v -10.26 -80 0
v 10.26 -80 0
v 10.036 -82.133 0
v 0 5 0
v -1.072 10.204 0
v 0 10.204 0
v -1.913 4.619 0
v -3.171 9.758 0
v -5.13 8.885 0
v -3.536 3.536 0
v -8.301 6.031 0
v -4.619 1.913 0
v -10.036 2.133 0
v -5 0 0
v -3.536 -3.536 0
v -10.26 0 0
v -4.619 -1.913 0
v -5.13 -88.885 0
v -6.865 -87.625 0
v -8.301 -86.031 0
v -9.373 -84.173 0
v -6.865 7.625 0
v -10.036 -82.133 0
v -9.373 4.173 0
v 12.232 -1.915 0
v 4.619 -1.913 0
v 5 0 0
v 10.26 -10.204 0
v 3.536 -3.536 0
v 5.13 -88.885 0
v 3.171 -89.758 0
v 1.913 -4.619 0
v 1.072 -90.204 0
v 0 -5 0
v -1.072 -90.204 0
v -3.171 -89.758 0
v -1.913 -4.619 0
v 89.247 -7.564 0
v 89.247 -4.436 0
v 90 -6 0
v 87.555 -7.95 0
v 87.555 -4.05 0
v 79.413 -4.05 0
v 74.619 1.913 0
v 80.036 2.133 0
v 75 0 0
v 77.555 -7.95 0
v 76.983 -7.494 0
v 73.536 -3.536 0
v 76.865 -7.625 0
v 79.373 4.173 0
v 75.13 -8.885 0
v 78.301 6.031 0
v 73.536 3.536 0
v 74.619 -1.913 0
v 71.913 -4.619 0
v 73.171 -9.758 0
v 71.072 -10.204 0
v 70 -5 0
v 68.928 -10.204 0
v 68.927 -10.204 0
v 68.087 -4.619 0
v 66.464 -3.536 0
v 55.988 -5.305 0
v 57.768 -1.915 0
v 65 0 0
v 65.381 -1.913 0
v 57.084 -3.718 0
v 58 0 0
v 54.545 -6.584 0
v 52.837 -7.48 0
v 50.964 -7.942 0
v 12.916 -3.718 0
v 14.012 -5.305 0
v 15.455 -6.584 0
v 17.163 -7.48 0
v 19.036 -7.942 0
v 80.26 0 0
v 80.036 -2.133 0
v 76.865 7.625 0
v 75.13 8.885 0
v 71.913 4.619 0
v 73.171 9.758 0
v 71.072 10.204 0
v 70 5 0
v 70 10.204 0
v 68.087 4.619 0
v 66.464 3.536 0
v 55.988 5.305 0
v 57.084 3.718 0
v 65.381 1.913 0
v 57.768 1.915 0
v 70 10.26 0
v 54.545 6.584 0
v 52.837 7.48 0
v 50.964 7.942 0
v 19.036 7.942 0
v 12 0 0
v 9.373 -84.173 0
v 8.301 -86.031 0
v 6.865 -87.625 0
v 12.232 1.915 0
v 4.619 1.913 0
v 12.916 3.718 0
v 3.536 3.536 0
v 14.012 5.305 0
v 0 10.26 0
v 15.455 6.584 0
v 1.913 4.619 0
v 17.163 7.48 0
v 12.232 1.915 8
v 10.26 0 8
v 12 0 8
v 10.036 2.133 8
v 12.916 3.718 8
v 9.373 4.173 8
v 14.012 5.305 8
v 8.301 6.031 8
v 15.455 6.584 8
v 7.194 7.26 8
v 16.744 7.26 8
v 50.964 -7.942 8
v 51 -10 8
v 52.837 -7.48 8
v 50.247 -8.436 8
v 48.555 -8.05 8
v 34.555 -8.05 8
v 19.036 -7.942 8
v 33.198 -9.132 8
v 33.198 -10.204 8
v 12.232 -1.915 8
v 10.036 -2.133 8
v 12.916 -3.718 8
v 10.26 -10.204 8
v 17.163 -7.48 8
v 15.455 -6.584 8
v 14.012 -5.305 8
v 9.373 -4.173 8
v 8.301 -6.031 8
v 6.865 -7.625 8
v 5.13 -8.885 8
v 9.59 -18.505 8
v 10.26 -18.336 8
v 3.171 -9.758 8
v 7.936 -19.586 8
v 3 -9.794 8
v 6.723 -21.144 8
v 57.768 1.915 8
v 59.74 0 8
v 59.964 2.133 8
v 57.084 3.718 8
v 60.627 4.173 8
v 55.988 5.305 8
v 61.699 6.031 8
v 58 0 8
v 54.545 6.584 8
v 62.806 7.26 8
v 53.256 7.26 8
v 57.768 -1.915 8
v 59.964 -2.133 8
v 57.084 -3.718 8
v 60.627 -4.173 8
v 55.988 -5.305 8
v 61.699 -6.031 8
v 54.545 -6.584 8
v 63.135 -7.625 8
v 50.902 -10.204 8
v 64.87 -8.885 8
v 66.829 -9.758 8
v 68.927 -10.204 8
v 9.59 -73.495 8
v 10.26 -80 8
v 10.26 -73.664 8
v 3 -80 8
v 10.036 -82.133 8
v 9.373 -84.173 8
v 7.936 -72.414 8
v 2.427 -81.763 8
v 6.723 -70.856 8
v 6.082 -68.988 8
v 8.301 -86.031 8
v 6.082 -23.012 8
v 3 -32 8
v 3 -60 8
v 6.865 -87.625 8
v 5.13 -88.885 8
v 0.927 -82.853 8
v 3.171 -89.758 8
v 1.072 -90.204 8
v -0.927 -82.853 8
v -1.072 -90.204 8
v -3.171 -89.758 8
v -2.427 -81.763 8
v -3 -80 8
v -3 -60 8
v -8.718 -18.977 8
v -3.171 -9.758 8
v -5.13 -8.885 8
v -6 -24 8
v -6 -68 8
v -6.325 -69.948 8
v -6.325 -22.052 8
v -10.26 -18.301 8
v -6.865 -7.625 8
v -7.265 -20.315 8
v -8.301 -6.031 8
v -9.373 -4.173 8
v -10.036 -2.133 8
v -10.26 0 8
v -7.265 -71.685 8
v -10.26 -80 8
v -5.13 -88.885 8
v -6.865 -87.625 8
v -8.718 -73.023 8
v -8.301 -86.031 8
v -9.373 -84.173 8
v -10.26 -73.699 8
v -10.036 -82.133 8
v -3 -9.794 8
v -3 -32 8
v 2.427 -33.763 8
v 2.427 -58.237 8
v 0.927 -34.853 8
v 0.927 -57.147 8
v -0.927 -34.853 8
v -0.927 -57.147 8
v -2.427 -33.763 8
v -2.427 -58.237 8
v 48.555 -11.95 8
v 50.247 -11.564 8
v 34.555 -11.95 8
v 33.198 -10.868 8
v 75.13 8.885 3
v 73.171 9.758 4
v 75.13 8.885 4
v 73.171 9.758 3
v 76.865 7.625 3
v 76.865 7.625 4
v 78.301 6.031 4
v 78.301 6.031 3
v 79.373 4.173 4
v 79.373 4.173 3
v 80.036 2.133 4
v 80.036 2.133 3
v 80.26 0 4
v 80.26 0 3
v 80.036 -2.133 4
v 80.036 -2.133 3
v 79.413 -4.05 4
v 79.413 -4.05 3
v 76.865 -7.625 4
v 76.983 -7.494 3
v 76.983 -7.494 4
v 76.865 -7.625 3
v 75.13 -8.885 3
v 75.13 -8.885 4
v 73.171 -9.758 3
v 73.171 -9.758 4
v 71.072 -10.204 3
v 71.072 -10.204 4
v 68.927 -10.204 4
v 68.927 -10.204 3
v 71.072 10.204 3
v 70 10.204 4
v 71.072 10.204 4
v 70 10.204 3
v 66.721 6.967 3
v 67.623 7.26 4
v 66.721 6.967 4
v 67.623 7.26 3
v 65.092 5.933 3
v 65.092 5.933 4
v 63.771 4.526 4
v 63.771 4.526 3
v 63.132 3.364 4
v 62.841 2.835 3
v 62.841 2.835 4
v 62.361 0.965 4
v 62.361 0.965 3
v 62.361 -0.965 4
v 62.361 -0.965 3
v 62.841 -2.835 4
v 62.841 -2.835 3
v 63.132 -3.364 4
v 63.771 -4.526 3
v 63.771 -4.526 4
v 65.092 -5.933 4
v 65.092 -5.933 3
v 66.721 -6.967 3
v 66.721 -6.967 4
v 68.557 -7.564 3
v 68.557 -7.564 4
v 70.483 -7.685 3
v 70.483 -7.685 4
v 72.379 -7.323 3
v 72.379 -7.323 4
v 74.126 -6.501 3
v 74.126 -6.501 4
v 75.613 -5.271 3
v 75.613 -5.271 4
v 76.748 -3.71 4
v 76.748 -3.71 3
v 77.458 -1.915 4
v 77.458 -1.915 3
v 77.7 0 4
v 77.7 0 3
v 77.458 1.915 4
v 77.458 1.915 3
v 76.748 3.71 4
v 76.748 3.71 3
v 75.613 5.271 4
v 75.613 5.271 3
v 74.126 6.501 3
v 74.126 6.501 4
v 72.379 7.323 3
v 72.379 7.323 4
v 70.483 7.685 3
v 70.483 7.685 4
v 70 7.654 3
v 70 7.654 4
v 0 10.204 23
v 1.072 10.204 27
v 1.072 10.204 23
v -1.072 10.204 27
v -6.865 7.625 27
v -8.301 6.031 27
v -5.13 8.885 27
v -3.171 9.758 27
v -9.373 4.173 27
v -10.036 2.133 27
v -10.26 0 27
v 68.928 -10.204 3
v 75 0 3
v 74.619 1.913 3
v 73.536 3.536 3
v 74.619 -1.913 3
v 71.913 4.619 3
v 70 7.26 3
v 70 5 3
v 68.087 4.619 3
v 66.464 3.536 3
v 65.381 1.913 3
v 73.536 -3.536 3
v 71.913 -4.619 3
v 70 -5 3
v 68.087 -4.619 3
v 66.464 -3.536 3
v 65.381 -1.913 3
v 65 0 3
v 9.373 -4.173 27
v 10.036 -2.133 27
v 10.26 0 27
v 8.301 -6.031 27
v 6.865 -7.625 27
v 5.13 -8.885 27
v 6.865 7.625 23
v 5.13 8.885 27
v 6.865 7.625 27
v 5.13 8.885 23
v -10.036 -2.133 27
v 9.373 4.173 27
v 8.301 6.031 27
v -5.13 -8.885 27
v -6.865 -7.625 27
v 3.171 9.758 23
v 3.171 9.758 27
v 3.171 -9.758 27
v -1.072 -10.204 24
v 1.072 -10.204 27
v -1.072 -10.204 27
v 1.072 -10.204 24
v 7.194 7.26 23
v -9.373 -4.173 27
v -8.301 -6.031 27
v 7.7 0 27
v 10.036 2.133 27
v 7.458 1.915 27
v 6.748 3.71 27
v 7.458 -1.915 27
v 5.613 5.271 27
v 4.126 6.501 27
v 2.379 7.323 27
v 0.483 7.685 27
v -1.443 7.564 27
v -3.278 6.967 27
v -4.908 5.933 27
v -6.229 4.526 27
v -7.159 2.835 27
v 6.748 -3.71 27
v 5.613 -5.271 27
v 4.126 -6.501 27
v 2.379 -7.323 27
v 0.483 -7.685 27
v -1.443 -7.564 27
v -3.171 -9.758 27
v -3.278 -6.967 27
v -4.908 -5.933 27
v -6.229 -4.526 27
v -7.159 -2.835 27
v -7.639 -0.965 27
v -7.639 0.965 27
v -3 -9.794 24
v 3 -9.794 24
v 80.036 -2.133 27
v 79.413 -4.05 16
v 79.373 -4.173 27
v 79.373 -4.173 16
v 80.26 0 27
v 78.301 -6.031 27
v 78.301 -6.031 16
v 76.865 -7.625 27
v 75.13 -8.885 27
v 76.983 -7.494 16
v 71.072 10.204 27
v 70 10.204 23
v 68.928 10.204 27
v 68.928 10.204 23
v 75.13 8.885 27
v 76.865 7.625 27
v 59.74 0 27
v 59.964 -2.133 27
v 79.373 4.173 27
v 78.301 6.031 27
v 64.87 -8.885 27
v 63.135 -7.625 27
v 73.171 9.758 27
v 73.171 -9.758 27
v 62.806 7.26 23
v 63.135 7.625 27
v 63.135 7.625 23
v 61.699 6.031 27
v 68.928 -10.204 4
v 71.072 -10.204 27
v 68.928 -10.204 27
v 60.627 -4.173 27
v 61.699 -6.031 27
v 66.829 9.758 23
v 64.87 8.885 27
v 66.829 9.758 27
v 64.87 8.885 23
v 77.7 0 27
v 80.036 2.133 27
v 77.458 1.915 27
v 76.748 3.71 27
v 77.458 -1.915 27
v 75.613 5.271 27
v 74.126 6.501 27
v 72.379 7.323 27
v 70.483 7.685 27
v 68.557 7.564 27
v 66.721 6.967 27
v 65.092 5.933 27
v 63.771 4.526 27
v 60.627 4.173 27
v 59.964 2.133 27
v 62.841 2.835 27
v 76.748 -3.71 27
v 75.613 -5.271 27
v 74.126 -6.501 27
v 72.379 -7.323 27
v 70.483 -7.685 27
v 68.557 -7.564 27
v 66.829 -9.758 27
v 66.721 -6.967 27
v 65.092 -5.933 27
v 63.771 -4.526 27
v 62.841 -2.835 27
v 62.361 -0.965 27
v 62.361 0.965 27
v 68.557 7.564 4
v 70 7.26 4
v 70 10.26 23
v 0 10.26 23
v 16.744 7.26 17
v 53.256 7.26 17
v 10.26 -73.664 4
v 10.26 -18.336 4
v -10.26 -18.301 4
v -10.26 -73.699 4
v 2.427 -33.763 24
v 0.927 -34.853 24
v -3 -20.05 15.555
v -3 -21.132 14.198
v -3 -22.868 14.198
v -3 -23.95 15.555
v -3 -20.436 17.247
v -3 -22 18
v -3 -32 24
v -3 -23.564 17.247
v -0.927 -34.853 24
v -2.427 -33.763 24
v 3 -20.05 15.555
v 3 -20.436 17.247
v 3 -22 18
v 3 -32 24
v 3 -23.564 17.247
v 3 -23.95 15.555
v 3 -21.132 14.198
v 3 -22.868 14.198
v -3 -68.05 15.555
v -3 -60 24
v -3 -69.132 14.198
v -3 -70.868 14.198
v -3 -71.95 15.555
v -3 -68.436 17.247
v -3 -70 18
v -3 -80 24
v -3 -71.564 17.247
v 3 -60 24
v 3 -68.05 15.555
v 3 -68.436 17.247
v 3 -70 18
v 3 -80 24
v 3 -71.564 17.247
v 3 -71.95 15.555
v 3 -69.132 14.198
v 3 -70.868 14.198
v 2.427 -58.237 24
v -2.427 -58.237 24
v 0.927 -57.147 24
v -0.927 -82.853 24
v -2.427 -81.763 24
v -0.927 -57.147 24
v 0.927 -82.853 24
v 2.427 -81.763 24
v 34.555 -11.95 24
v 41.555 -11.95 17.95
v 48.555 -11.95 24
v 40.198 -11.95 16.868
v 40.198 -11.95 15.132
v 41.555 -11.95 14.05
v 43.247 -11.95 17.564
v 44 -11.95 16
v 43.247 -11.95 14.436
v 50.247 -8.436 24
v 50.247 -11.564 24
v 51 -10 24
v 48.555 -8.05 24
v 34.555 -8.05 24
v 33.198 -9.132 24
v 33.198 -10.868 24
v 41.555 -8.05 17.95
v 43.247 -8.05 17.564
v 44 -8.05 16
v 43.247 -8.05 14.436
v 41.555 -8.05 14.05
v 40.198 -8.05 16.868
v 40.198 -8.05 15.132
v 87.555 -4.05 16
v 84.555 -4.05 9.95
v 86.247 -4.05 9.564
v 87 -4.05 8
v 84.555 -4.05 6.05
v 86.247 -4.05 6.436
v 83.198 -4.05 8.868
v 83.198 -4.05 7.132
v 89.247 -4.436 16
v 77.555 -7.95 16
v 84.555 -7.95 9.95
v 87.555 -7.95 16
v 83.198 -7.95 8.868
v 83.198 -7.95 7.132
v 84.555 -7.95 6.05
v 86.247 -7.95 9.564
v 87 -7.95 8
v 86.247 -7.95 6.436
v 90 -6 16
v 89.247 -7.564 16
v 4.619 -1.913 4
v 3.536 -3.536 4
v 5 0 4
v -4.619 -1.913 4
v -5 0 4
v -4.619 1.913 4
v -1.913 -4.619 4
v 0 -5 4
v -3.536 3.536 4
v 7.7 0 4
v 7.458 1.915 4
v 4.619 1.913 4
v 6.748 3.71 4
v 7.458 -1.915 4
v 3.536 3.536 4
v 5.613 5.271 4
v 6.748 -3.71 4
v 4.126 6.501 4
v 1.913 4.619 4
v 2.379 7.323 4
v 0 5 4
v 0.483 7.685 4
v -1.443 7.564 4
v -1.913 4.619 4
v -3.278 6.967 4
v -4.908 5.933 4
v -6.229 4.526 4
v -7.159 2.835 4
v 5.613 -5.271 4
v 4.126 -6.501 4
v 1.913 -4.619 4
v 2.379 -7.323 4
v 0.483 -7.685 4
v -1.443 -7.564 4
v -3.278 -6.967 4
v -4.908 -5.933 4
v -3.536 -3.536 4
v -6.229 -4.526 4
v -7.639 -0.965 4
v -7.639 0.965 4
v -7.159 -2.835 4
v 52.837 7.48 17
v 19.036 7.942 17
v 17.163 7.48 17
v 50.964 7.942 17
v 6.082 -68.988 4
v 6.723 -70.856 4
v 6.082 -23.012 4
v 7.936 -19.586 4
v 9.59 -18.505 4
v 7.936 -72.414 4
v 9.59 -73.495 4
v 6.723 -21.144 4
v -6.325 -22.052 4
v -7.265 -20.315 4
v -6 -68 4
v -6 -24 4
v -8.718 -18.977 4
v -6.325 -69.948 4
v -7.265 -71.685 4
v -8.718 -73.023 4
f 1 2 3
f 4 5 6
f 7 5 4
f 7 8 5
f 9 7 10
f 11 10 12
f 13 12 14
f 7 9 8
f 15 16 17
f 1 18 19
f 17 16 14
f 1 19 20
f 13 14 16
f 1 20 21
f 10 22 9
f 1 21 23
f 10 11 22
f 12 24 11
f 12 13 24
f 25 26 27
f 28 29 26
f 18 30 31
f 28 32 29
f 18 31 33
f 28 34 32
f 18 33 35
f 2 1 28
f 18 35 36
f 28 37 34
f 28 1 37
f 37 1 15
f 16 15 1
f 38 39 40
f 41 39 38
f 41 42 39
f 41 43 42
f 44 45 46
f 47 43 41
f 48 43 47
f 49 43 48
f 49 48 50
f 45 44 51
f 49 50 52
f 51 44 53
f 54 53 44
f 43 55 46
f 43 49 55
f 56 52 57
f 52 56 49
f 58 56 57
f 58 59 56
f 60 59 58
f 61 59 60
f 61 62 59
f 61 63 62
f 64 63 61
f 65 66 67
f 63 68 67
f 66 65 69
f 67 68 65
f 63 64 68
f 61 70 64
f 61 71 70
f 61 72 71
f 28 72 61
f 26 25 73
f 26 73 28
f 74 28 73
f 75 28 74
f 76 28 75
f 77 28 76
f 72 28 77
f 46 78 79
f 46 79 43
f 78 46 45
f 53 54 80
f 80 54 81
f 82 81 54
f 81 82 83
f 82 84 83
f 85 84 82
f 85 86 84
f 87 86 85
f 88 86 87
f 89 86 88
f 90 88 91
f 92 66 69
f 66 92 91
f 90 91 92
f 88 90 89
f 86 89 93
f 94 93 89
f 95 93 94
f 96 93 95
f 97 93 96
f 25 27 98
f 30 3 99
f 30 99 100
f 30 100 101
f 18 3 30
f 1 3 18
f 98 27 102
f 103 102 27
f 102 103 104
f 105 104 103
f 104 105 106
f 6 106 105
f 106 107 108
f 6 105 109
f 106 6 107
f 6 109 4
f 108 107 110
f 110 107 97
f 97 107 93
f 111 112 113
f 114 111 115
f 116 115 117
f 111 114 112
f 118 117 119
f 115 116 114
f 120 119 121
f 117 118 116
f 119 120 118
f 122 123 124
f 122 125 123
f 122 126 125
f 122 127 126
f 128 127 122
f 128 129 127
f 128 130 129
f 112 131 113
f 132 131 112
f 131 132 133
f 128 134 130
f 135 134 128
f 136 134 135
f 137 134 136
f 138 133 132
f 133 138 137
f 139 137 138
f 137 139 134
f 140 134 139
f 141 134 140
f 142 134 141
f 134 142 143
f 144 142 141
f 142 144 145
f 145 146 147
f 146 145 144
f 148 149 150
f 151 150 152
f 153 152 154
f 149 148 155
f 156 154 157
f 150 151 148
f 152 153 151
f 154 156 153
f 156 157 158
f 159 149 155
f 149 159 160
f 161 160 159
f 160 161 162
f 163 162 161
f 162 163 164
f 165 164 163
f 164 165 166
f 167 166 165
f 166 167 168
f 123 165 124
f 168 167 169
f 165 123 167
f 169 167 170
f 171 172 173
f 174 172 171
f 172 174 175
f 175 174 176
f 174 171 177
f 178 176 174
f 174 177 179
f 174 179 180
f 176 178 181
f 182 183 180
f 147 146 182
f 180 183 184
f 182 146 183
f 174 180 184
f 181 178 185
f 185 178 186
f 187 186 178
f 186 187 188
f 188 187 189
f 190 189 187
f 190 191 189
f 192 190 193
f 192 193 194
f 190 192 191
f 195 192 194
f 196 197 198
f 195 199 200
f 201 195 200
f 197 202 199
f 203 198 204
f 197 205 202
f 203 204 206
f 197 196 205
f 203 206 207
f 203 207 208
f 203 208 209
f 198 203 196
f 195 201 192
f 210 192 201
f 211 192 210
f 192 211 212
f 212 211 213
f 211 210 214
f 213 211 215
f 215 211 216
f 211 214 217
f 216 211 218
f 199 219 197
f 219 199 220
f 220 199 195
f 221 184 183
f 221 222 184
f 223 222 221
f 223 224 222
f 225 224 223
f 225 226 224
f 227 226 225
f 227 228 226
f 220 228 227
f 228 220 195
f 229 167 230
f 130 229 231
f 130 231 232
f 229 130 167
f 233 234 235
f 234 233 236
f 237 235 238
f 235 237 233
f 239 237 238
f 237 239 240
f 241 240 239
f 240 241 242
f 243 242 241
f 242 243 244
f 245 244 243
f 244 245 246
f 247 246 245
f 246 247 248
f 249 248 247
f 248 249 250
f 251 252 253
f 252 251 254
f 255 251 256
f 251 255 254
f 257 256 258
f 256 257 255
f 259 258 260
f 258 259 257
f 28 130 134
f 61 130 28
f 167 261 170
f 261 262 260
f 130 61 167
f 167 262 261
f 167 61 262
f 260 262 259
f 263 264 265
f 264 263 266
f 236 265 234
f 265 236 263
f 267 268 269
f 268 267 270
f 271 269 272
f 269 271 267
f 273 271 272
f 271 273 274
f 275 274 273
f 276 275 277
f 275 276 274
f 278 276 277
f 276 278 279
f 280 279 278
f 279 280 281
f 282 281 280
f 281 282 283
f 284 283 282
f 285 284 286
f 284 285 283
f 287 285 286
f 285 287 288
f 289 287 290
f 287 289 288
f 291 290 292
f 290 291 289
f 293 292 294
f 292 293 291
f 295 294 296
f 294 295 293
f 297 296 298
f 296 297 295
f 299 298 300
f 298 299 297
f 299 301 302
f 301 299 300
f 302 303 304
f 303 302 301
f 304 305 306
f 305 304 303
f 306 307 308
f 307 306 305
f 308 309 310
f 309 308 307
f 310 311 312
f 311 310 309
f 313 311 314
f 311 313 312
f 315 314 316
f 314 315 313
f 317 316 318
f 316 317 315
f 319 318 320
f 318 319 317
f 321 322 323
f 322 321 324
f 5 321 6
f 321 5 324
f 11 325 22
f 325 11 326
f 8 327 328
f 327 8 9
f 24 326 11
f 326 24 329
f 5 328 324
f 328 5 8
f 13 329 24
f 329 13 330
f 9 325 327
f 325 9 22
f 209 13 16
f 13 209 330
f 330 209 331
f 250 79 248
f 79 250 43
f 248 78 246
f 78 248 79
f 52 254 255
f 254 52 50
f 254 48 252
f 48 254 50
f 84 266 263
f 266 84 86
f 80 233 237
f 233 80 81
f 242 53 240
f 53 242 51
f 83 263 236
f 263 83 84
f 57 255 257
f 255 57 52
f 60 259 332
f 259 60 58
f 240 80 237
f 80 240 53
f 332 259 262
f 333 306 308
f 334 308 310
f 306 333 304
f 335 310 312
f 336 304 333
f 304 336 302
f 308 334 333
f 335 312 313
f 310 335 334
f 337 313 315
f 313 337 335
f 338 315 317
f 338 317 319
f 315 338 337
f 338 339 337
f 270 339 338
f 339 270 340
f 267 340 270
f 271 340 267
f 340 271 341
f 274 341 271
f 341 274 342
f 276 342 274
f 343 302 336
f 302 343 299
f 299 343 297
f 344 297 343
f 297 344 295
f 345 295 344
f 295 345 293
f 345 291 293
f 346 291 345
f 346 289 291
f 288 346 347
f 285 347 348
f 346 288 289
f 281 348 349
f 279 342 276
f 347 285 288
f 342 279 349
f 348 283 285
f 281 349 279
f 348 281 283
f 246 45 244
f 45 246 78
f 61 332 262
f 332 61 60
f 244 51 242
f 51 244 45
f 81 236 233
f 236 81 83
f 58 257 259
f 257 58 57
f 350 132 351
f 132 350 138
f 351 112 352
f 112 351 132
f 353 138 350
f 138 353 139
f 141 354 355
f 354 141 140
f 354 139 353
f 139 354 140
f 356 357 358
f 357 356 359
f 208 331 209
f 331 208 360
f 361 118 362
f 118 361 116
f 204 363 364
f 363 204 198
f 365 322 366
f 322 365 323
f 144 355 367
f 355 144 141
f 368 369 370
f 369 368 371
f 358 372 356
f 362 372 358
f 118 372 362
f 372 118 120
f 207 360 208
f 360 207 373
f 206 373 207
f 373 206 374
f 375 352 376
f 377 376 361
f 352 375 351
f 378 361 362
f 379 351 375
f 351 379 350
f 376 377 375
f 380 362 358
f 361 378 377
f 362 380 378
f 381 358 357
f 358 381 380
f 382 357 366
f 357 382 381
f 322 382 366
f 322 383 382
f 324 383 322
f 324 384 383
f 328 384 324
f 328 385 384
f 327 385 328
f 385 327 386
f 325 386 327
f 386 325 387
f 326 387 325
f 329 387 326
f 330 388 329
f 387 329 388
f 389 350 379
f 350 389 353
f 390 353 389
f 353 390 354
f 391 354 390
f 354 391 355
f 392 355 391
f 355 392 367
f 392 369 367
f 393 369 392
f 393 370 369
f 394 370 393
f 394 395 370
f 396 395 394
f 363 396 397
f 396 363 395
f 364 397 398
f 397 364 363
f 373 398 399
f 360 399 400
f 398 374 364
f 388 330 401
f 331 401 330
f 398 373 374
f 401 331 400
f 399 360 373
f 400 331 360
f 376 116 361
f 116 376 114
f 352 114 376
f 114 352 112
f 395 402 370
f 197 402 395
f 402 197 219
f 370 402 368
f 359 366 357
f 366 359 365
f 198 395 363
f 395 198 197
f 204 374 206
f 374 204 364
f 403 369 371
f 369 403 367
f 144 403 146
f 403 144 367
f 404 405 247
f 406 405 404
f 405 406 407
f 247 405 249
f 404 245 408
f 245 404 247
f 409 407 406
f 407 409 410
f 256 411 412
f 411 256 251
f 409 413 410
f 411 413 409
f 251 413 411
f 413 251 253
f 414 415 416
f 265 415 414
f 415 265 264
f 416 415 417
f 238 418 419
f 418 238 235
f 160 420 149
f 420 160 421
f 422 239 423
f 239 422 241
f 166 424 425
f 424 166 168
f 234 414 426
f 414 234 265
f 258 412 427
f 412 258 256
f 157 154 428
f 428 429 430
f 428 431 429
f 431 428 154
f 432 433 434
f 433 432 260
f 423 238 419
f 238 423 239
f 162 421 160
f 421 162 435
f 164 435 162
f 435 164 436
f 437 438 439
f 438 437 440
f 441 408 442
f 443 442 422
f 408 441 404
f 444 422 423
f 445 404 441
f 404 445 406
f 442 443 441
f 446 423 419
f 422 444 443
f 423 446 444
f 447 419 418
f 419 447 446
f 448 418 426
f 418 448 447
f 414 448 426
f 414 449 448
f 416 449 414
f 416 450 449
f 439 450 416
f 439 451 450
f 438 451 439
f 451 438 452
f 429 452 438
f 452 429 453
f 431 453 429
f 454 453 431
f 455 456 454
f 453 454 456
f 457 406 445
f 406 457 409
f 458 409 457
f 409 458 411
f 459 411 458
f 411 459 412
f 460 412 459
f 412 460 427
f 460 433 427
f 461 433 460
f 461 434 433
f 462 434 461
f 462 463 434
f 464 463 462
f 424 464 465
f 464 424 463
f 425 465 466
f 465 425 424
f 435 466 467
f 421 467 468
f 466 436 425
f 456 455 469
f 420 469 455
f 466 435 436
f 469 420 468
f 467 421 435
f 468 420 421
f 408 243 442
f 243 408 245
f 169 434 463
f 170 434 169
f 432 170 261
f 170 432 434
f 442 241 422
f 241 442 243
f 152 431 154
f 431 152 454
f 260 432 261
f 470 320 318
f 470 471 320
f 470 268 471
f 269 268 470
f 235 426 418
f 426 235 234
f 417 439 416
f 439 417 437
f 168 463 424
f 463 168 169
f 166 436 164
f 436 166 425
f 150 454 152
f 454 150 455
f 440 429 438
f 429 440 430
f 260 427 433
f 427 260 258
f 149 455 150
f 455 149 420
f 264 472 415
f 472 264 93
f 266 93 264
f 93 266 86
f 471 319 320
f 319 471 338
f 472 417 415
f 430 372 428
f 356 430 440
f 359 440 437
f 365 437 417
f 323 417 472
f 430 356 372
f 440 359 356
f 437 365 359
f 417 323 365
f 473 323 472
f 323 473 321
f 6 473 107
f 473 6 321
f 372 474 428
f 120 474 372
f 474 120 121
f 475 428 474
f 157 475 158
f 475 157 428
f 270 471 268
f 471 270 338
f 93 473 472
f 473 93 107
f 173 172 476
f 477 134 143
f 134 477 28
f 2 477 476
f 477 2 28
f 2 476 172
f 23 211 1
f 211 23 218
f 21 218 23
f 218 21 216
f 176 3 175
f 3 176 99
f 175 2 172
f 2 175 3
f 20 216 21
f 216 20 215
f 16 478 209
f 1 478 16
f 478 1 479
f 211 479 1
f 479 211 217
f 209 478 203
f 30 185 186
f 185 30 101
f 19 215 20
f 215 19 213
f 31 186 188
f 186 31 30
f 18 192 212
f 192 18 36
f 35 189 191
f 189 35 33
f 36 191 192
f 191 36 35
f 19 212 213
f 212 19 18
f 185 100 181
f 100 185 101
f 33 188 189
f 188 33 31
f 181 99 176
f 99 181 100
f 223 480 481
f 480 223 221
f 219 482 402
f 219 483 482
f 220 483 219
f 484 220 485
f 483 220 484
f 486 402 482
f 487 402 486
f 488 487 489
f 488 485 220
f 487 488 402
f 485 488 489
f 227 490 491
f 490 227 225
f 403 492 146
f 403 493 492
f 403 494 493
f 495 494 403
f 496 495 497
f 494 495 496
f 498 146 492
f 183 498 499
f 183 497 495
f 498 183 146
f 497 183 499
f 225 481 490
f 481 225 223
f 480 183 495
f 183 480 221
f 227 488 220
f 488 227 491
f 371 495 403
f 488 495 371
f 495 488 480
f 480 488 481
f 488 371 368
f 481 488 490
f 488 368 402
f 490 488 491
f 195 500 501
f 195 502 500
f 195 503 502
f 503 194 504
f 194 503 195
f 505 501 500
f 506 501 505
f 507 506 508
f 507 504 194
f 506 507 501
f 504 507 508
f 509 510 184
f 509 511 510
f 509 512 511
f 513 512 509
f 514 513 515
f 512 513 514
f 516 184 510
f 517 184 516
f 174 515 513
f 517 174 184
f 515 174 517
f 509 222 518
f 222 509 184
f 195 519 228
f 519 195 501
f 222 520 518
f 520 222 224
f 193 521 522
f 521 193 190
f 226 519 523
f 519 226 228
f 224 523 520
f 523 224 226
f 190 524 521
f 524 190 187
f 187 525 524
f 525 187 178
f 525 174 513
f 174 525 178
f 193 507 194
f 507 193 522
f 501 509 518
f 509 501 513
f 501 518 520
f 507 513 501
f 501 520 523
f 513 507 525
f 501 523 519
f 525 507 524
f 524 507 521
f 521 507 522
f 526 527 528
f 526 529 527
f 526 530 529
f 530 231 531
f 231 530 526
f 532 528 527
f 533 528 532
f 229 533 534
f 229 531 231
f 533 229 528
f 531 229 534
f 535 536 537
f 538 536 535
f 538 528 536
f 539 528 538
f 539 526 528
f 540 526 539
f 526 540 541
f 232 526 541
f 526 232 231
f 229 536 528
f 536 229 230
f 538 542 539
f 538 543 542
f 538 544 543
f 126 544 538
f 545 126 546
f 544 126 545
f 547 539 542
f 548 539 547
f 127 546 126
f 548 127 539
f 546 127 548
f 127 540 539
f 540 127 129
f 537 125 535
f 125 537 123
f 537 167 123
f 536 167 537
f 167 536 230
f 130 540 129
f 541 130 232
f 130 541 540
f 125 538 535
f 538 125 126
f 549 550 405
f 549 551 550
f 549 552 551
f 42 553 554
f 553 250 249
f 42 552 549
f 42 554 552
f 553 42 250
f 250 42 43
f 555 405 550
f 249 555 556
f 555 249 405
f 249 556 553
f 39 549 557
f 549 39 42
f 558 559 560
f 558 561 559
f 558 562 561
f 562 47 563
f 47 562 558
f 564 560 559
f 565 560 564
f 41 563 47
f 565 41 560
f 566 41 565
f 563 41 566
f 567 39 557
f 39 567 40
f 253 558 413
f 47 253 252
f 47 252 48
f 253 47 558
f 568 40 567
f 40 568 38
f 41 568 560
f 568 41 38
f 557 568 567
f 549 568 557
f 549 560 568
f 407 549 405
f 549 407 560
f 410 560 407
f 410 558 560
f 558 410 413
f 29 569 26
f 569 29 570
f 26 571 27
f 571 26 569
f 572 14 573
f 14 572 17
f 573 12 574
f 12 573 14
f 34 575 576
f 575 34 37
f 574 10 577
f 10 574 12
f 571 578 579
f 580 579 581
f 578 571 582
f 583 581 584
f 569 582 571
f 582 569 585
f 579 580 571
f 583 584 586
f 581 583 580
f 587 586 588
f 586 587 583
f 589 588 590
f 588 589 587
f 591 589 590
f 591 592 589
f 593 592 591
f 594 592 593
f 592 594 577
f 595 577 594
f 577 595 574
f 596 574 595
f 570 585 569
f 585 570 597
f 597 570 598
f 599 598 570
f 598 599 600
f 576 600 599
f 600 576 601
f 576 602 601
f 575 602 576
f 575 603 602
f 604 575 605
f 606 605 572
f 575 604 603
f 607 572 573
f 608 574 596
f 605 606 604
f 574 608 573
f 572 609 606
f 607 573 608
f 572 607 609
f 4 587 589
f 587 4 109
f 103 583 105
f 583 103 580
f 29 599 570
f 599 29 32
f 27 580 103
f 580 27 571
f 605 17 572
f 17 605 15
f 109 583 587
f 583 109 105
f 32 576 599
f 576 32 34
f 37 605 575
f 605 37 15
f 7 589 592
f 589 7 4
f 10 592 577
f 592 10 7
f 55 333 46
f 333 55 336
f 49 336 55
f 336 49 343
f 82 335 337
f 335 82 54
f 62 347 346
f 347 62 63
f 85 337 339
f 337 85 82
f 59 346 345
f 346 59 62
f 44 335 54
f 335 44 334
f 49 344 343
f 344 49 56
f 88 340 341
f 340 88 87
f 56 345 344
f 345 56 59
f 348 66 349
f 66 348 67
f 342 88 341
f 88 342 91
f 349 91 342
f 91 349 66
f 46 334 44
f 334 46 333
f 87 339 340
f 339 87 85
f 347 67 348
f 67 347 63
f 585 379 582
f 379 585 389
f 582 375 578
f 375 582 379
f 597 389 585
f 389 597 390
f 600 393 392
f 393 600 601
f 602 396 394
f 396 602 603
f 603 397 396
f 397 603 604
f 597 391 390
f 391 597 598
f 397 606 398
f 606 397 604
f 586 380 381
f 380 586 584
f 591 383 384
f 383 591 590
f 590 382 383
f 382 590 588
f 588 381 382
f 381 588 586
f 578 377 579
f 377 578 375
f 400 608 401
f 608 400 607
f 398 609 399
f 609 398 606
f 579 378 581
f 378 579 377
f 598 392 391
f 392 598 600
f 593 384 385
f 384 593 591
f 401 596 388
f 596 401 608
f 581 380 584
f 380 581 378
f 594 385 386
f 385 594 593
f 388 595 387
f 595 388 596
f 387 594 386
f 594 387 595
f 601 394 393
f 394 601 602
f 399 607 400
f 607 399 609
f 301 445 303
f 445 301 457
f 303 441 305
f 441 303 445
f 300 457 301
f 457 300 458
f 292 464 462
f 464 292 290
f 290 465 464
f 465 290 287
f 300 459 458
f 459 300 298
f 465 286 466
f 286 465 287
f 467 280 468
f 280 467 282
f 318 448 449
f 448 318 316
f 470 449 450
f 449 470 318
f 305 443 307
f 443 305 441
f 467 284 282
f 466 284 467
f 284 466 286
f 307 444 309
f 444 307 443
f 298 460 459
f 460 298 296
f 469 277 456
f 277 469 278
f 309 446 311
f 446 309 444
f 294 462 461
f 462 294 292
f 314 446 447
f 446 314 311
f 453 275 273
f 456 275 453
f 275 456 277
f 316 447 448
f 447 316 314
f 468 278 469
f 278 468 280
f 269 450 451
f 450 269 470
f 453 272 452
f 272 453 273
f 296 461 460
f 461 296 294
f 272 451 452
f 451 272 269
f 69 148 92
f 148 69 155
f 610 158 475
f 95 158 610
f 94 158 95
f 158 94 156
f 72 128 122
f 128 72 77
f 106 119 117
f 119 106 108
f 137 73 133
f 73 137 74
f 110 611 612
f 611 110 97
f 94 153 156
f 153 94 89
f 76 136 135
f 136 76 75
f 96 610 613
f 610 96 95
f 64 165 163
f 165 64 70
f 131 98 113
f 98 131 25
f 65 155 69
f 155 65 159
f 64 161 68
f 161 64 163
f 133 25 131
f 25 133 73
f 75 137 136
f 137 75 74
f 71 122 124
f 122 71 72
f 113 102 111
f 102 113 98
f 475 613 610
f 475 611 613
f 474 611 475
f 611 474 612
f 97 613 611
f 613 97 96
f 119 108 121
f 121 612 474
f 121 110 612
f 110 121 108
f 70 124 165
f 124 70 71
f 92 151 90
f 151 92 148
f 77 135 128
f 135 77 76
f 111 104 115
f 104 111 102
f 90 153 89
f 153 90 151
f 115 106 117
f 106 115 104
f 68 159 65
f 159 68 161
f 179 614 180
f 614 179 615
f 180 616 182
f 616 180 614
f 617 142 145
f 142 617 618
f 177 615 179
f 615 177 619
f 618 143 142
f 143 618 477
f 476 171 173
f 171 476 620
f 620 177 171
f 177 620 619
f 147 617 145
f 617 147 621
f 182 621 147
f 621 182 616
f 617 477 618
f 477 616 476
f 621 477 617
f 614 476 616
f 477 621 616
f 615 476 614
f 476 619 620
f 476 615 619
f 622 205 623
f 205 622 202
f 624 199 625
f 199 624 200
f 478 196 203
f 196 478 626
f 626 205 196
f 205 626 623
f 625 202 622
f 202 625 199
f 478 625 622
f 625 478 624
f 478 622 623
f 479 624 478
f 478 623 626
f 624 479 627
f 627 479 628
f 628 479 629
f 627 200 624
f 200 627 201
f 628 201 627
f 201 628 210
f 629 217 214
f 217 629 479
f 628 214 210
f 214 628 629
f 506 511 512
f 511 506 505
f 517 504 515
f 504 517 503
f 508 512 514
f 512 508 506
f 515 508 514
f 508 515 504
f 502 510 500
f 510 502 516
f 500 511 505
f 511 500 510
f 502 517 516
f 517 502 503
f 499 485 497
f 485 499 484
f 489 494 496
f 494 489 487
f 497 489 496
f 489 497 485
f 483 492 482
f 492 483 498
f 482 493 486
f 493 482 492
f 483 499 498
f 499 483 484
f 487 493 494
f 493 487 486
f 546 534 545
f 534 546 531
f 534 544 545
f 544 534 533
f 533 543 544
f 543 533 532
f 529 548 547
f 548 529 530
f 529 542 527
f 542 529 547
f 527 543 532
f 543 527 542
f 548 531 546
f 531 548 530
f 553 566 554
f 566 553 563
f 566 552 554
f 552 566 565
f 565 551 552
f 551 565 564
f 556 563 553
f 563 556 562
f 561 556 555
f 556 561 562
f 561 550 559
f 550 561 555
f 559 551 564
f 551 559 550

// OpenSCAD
// file: configuration.scad
rod_radius = 6.0;
frame_rod_radius = 4.0;
z_threaded_rod_radius = 4.0;

y_rod_height = 70;
x_rod_spacing = 70;

bearing_radius = 11; 					// 608 bearing

//  LM8 = 7.5  LM10 = 9.5  LM12 = 10.5
linear_bearing_radius =  7.6;  // LM8 + some extra space

z_threaded_to_smooth_spacing = 30;   // 30mm is OK for 8mm rods 
x_end_threaded_rod_height = 20;
// file: x-carriage-v2.scad
include <configuration.scad>

bearing_r = linear_bearing_radius + 0.1;

extr_shelf_arm_length = 80;
extr_shelf_arm_height = 8;
extr_shelf_height = 16;
extr_shelf_length_a = 32;
extr_shelf_length_b = 46;

mirror([0,1,0]){
	x_arm_v2();
}



module x_arm_v2(){

	arm_end_radius = linear_bearing_radius * 1.35;

	difference(){

		union(){

			arm(x_rod_spacing, arm_end_radius, bearing_r, 8);

			cylinder(r=arm_end_radius, h=3);
			translate([x_rod_spacing,0, 0])
				cylinder(r=arm_end_radius, h=3);

			translate([0, 0, 4])
				cylinder(r=arm_end_radius, h=23);
			translate([x_rod_spacing,0, 4])
				cylinder(r=arm_end_radius, h=23);

			translate([0, -arm_end_radius, 0])
				cube([x_rod_spacing, 3, 23]);
			
			hull(){

				translate([0, 0, 0])
					cylinder(r=arm_end_radius, h=extr_shelf_arm_height);
				translate([0,extr_shelf_arm_length, 0])
					cylinder(r=arm_end_radius, h=extr_shelf_arm_height);


			}

			hull(){

				translate([0, 0, extr_shelf_arm_height])
					cylinder(r=3, h=extr_shelf_height);
				translate([0,extr_shelf_length_a, extr_shelf_arm_height])
					cylinder(r=3, h=extr_shelf_height);


			}


			hull(){

				translate([0, extr_shelf_arm_length - 20, extr_shelf_arm_height])
					cylinder(r=3, h=extr_shelf_height);
				translate([0, extr_shelf_arm_length, extr_shelf_arm_height])
					cylinder(r=3, h=extr_shelf_height);


			}


			// belt clamp mount
			hull(){

				translate([x_rod_spacing / 2, 10, extr_shelf_arm_height])
					cylinder(r=2, h=extr_shelf_height);
				translate([x_rod_spacing / 2 + 14, 10, extr_shelf_arm_height])
					cylinder(r=2, h=extr_shelf_height);


			}

			// wiring clip
			hull(){

				translate([x_rod_spacing + 8, 6, 0])
					cylinder(r=2, h=extr_shelf_height);
				translate([x_rod_spacing + 18, 6, 0])
					cylinder(r=2, h=extr_shelf_height);


			}




		}
		
		translate([0,0,-1])
			cylinder(r=5, h=5);
		
		translate([x_rod_spacing,0,-1])
			cylinder(r=5, h=5);
	
		translate([0,0,4])
			#cylinder(r=bearing_r, h=25);
		
		translate([x_rod_spacing,0,4])
			#cylinder(r=bearing_r, h=25);


		#hull(){	
			translate([20, 0, -1])
				cylinder(r=8, h=18);
	
			translate([x_rod_spacing - 20,  0, -1])
				cylinder(r=8, h=18);
		}


		#hull(){	
			translate([12, 24, 4])
				cylinder(r=6, h=8);
	
			translate([12, extr_shelf_arm_length - 12, 4])
				cylinder(r=6, h=8);
		}


		#hull(){	
			translate([-12, 24, 4])
				cylinder(r=6, h=8);
	
			translate([-12, extr_shelf_arm_length - 12, 4])
				cylinder(r=6, h=8);
		}

		// M3 holes for plate
			translate([6, extr_shelf_arm_length - 10, 16])
				rotate([0,-90,0])
					#cylinder(r=2, h=10);
			
			translate([6, 22, 16])
				rotate([0,-90,0])
					#cylinder(r=2, h=10);
	

		// M3 hole for belt mount
			translate([x_rod_spacing / 2 + 7, 4, 16])
				rotate([-90,0,0])
					#cylinder(r=2, h=10);
		
		// M3 hole for wiring clip
			translate([x_rod_spacing + 15, 4, 8])
				rotate([-90,0,0])
					#cylinder(r=2, h=10);


	}

}


module arm(length, radius, hole_radius, height){
	
	linear_extrude(height=height){

		difference(){

			hull(){
		
				circle(r=radius);
				translate([length, 0])
					circle(r=radius);
			}	
	

			union(){
	
				circle(r=hole_radius);
				translate([length, 0])
					circle(r=hole_radius);
			

			}
		}
	}

}
// main file
use <x-carriage-v2.scad>


mirror([0,1,0]){
		x_arm_v2();
}
